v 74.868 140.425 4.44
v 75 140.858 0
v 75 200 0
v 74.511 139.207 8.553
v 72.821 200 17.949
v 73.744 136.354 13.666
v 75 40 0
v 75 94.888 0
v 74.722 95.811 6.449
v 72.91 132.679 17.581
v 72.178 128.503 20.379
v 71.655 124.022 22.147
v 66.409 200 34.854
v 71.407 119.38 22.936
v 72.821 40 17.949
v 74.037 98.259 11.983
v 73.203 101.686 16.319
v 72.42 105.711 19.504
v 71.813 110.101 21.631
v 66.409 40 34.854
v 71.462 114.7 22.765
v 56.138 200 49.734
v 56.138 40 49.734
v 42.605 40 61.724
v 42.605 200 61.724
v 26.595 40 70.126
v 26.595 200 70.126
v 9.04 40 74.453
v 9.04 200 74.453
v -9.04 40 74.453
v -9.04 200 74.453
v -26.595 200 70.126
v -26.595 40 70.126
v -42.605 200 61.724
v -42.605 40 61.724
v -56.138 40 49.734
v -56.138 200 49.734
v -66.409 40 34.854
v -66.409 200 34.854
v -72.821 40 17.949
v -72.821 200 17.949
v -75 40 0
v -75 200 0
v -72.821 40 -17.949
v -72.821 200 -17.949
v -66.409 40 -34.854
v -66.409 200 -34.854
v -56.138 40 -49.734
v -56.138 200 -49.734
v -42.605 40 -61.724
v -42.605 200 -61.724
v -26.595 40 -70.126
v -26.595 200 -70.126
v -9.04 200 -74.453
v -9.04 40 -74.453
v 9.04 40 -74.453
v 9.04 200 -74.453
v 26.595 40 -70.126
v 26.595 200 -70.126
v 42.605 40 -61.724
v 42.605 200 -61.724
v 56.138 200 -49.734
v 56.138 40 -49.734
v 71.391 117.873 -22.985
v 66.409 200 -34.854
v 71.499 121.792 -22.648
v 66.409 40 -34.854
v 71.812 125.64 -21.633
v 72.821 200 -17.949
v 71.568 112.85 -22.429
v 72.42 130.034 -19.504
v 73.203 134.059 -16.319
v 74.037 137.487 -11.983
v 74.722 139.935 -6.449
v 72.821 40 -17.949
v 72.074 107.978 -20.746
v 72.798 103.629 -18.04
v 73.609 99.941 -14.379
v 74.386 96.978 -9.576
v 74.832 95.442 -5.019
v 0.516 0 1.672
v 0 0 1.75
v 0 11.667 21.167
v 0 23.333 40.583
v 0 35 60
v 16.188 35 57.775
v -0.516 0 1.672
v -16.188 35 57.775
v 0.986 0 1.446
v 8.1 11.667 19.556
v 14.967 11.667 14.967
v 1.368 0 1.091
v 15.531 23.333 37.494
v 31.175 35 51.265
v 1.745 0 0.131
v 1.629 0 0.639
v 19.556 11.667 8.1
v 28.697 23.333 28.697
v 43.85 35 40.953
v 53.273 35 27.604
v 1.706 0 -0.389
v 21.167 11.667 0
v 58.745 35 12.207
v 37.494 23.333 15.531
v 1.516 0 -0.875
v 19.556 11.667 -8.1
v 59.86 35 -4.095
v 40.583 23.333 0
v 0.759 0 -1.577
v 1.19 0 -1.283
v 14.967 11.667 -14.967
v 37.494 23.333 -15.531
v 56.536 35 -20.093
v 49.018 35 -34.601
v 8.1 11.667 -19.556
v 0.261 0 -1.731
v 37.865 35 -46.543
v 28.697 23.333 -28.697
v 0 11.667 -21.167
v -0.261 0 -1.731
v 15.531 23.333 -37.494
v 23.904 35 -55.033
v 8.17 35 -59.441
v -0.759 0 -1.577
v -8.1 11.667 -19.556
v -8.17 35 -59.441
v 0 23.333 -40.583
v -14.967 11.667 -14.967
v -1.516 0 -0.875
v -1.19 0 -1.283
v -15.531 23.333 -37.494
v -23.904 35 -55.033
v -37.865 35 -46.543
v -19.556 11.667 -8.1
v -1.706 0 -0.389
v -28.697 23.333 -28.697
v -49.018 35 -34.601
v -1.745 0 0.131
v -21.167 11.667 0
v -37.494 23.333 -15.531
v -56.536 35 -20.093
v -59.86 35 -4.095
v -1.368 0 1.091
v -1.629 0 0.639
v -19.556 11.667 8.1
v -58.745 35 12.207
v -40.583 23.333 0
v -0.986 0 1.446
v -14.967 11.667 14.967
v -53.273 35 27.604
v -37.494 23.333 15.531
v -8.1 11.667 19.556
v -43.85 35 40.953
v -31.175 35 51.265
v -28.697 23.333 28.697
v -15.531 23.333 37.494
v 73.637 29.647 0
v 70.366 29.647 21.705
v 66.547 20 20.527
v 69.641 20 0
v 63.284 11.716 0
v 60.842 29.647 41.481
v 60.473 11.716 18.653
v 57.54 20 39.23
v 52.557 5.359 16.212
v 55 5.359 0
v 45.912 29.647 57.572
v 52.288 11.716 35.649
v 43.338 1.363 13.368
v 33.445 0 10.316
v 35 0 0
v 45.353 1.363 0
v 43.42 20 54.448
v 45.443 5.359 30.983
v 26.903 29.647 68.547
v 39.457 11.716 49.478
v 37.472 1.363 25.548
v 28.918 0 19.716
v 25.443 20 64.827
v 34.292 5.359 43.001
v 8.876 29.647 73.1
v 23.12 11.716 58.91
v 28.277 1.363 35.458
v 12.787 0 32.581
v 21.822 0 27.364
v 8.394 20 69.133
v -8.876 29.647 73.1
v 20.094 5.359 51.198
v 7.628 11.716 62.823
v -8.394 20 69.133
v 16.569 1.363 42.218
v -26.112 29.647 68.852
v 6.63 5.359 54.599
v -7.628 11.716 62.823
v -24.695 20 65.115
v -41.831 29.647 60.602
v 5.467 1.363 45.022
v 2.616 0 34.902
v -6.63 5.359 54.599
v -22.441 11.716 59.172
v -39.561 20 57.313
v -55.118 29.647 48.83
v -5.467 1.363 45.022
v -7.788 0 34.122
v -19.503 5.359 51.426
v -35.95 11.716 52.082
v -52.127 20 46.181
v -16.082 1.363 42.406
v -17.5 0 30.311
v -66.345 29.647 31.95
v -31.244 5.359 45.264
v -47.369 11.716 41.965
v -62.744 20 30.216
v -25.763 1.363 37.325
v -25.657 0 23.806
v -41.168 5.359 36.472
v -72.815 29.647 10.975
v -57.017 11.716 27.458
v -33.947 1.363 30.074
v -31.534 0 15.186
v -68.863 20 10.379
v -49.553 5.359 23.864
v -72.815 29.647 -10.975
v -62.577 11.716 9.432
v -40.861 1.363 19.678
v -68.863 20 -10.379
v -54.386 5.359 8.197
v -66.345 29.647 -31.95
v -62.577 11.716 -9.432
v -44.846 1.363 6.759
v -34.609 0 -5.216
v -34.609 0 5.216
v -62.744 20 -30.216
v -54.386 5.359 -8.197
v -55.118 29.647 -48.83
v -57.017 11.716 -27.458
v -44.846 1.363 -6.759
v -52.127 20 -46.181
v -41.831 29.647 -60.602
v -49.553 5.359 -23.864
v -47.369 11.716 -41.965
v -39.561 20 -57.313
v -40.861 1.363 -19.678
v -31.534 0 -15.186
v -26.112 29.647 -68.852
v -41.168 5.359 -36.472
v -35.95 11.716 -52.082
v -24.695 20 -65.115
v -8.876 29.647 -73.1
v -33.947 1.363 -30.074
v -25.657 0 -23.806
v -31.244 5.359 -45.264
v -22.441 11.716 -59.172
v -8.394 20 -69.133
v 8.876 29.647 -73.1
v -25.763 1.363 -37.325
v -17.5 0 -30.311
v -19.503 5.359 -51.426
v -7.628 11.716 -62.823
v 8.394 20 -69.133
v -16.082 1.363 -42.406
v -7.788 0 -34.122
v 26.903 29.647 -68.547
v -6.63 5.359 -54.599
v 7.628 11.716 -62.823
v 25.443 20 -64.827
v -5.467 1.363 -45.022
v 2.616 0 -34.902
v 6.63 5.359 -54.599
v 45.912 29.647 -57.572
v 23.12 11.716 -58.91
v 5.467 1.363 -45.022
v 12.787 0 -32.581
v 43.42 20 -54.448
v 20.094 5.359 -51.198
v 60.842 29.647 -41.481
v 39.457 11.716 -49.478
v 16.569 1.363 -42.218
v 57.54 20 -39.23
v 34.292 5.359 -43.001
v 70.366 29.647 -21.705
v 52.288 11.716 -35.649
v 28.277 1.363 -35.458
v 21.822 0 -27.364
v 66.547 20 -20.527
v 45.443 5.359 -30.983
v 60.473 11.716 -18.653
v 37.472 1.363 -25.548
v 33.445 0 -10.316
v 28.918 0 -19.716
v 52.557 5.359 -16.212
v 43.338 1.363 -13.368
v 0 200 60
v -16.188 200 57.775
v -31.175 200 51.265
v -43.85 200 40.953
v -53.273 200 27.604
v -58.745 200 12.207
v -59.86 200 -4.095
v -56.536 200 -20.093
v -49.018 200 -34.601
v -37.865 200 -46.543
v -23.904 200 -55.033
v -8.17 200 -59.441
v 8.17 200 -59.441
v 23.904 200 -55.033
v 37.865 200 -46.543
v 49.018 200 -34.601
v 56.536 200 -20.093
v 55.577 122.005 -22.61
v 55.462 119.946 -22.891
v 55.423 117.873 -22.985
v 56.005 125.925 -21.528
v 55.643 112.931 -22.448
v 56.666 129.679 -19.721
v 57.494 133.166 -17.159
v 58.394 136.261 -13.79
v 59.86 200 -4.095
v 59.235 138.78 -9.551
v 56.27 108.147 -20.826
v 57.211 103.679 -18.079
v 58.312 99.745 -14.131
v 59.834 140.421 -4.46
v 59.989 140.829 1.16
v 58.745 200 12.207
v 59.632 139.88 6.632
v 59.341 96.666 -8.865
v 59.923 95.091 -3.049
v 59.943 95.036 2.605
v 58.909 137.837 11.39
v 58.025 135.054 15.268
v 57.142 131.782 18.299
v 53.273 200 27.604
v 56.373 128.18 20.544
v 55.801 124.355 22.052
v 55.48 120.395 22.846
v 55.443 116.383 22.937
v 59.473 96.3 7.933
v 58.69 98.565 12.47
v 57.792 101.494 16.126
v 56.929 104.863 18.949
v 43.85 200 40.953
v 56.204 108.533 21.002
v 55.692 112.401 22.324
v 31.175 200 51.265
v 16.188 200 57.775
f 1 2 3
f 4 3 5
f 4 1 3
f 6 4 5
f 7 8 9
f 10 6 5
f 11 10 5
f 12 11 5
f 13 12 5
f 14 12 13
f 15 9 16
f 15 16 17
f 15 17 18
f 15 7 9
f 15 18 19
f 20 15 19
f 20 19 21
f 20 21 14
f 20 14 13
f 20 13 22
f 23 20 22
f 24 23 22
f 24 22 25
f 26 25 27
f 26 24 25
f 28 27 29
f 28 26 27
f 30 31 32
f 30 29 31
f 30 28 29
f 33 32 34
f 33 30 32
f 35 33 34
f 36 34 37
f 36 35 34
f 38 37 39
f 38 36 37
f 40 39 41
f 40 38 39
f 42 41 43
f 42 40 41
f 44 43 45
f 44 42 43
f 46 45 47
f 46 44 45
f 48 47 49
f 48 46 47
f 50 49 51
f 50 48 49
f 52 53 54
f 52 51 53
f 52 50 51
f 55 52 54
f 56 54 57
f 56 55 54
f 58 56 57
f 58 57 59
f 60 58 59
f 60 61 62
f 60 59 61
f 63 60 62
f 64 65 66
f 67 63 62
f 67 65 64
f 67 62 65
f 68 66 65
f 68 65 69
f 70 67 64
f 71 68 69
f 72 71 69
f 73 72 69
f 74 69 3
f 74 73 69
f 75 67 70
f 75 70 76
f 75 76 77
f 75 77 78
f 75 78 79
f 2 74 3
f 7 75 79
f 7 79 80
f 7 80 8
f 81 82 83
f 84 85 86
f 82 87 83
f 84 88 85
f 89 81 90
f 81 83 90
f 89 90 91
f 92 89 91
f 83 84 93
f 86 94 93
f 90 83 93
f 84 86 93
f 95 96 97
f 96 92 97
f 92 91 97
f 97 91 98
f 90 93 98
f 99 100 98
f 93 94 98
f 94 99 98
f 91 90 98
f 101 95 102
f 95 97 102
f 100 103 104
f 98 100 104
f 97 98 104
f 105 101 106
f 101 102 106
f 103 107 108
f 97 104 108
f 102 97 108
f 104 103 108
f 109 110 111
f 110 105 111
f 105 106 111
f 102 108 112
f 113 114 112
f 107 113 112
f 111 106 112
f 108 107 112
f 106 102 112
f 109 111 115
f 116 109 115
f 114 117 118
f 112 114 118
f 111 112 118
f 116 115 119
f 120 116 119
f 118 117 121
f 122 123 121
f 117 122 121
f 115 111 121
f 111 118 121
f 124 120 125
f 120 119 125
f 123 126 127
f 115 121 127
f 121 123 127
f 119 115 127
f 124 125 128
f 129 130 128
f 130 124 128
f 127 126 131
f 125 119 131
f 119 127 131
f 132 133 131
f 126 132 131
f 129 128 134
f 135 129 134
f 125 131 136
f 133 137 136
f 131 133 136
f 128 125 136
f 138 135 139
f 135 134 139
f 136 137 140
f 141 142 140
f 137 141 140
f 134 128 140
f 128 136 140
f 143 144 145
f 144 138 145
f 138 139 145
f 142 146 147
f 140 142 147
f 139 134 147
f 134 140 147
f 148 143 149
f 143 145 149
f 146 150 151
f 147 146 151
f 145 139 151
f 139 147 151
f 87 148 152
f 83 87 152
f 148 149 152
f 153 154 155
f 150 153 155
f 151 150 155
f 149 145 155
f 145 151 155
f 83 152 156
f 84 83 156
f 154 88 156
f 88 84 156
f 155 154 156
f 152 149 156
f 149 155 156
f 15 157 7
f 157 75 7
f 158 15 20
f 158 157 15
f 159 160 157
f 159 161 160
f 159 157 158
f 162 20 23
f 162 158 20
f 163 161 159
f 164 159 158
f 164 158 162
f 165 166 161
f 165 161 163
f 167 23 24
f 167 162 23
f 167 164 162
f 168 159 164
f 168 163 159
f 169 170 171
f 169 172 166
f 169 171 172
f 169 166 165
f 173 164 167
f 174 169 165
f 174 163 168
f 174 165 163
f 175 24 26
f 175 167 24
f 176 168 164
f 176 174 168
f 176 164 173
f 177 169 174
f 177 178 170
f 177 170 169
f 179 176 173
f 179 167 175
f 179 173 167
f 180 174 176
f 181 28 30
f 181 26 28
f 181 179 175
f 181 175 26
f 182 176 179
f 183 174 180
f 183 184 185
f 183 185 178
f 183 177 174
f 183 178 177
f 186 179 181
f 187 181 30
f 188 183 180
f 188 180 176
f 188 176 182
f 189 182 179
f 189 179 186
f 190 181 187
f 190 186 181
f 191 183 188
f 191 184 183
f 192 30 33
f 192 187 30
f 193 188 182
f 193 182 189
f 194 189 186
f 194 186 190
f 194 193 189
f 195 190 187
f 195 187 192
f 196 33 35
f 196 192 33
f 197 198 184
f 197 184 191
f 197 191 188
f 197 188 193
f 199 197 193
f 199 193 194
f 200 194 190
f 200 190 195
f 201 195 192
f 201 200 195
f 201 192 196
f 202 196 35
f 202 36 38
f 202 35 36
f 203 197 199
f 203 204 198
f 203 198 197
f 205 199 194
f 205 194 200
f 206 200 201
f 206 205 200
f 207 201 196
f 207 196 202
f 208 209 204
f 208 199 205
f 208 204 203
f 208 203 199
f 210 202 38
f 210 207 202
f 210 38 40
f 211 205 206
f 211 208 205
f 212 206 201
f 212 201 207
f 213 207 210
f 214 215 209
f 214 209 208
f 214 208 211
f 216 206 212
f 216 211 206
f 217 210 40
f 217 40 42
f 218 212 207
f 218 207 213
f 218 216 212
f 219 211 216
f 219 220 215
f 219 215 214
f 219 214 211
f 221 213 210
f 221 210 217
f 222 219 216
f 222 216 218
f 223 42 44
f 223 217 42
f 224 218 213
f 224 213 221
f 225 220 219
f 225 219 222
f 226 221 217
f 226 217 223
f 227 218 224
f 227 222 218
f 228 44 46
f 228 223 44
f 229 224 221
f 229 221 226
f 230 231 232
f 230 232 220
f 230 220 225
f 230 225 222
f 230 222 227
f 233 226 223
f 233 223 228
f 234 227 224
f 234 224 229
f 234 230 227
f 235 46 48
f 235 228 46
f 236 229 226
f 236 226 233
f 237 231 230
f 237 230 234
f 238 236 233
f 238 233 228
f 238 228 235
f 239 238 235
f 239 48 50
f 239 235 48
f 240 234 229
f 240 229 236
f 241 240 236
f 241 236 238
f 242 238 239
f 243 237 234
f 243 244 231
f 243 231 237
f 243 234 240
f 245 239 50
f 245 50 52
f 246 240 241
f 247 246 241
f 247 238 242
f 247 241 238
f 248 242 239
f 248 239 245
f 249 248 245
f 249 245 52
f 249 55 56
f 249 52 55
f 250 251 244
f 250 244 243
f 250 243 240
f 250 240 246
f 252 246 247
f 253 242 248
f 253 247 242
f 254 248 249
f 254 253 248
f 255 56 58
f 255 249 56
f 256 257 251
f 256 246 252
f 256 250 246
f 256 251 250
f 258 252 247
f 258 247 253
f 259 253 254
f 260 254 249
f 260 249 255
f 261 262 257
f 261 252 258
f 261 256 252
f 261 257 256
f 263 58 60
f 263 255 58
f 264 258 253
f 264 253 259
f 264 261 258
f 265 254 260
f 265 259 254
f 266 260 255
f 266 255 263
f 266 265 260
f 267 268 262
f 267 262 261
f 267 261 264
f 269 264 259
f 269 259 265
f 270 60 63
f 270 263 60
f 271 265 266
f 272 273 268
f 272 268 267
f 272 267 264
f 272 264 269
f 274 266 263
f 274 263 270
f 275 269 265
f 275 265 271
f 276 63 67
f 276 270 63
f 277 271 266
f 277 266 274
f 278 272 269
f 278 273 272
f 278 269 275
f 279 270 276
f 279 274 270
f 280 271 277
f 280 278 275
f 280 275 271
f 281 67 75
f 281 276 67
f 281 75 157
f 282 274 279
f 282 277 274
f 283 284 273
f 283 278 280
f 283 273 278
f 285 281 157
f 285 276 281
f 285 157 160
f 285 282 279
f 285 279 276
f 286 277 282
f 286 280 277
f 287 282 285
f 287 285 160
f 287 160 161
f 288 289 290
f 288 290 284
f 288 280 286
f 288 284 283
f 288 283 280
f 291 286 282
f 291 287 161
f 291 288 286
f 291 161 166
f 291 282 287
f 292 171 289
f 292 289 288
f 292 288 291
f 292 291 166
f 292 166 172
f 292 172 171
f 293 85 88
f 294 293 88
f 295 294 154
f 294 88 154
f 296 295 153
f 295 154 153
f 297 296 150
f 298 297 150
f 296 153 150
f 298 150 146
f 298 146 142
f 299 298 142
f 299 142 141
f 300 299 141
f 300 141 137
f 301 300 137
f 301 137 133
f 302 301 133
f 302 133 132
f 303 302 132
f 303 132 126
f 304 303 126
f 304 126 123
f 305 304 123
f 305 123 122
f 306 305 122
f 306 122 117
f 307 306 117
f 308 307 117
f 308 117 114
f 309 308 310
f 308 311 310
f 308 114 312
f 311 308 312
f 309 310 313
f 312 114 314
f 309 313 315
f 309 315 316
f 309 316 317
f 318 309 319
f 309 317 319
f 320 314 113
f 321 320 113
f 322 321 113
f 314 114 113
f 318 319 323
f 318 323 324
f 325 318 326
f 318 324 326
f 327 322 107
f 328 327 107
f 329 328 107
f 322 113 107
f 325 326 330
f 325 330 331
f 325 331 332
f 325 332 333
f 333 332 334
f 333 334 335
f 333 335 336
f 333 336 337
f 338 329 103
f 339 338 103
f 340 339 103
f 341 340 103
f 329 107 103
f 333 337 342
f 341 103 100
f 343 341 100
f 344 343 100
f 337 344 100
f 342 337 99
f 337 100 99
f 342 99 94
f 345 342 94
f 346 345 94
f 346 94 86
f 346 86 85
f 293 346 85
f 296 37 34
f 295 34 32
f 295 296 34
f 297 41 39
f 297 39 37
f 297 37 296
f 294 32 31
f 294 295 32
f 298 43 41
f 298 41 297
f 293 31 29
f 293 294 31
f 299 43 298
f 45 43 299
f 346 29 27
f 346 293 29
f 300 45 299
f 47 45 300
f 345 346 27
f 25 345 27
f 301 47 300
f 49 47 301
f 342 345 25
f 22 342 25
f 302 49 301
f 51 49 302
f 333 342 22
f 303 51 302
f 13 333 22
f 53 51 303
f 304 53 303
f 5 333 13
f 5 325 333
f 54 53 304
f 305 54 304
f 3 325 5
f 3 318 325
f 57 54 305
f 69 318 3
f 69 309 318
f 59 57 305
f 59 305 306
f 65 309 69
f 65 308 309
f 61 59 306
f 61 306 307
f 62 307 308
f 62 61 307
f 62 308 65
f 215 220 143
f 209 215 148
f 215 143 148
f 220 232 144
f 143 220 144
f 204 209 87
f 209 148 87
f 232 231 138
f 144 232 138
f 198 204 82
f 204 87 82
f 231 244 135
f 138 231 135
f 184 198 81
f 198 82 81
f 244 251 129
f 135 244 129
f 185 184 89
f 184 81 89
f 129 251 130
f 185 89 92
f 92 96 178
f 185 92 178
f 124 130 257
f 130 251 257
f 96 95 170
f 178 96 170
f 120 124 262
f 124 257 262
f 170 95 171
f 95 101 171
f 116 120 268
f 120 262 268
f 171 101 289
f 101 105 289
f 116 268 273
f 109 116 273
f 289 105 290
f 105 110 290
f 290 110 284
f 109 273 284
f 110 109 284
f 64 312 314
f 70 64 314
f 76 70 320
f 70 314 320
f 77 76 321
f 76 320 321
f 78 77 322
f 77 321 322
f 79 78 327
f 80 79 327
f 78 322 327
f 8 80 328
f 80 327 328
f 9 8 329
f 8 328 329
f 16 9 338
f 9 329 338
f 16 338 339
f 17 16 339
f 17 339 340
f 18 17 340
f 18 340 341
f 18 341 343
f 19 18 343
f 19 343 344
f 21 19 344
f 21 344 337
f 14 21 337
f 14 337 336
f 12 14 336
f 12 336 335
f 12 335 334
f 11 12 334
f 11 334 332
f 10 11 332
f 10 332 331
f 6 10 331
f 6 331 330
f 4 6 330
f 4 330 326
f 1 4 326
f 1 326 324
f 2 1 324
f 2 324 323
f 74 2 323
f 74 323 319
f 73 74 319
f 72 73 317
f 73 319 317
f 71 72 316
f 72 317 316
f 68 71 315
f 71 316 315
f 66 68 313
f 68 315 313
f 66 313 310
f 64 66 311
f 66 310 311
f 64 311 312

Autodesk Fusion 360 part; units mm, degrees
sketch "Sketch2" plane through (0, 0, 0) normal (0, 1, 0) x (1, 0, 0)
  circle A0 centre (0, 0) radius 75
  dimension "d1" = 150
extrude "Extrude1" add sketch "Sketch2" along normal blind 200
fillet "Fillet1" radius 40 1 edges at (-69.9246, 0, 27.1212)
hole "Hole1" at (0, 200, 0) direction (0, -1, 0) diameter 120 depth 165 tip angle 118
hole "Hole2" at (75, 117.8728, 0) direction (-1, 0, 0) diameter 45.97 depth 50 tip angle 118
